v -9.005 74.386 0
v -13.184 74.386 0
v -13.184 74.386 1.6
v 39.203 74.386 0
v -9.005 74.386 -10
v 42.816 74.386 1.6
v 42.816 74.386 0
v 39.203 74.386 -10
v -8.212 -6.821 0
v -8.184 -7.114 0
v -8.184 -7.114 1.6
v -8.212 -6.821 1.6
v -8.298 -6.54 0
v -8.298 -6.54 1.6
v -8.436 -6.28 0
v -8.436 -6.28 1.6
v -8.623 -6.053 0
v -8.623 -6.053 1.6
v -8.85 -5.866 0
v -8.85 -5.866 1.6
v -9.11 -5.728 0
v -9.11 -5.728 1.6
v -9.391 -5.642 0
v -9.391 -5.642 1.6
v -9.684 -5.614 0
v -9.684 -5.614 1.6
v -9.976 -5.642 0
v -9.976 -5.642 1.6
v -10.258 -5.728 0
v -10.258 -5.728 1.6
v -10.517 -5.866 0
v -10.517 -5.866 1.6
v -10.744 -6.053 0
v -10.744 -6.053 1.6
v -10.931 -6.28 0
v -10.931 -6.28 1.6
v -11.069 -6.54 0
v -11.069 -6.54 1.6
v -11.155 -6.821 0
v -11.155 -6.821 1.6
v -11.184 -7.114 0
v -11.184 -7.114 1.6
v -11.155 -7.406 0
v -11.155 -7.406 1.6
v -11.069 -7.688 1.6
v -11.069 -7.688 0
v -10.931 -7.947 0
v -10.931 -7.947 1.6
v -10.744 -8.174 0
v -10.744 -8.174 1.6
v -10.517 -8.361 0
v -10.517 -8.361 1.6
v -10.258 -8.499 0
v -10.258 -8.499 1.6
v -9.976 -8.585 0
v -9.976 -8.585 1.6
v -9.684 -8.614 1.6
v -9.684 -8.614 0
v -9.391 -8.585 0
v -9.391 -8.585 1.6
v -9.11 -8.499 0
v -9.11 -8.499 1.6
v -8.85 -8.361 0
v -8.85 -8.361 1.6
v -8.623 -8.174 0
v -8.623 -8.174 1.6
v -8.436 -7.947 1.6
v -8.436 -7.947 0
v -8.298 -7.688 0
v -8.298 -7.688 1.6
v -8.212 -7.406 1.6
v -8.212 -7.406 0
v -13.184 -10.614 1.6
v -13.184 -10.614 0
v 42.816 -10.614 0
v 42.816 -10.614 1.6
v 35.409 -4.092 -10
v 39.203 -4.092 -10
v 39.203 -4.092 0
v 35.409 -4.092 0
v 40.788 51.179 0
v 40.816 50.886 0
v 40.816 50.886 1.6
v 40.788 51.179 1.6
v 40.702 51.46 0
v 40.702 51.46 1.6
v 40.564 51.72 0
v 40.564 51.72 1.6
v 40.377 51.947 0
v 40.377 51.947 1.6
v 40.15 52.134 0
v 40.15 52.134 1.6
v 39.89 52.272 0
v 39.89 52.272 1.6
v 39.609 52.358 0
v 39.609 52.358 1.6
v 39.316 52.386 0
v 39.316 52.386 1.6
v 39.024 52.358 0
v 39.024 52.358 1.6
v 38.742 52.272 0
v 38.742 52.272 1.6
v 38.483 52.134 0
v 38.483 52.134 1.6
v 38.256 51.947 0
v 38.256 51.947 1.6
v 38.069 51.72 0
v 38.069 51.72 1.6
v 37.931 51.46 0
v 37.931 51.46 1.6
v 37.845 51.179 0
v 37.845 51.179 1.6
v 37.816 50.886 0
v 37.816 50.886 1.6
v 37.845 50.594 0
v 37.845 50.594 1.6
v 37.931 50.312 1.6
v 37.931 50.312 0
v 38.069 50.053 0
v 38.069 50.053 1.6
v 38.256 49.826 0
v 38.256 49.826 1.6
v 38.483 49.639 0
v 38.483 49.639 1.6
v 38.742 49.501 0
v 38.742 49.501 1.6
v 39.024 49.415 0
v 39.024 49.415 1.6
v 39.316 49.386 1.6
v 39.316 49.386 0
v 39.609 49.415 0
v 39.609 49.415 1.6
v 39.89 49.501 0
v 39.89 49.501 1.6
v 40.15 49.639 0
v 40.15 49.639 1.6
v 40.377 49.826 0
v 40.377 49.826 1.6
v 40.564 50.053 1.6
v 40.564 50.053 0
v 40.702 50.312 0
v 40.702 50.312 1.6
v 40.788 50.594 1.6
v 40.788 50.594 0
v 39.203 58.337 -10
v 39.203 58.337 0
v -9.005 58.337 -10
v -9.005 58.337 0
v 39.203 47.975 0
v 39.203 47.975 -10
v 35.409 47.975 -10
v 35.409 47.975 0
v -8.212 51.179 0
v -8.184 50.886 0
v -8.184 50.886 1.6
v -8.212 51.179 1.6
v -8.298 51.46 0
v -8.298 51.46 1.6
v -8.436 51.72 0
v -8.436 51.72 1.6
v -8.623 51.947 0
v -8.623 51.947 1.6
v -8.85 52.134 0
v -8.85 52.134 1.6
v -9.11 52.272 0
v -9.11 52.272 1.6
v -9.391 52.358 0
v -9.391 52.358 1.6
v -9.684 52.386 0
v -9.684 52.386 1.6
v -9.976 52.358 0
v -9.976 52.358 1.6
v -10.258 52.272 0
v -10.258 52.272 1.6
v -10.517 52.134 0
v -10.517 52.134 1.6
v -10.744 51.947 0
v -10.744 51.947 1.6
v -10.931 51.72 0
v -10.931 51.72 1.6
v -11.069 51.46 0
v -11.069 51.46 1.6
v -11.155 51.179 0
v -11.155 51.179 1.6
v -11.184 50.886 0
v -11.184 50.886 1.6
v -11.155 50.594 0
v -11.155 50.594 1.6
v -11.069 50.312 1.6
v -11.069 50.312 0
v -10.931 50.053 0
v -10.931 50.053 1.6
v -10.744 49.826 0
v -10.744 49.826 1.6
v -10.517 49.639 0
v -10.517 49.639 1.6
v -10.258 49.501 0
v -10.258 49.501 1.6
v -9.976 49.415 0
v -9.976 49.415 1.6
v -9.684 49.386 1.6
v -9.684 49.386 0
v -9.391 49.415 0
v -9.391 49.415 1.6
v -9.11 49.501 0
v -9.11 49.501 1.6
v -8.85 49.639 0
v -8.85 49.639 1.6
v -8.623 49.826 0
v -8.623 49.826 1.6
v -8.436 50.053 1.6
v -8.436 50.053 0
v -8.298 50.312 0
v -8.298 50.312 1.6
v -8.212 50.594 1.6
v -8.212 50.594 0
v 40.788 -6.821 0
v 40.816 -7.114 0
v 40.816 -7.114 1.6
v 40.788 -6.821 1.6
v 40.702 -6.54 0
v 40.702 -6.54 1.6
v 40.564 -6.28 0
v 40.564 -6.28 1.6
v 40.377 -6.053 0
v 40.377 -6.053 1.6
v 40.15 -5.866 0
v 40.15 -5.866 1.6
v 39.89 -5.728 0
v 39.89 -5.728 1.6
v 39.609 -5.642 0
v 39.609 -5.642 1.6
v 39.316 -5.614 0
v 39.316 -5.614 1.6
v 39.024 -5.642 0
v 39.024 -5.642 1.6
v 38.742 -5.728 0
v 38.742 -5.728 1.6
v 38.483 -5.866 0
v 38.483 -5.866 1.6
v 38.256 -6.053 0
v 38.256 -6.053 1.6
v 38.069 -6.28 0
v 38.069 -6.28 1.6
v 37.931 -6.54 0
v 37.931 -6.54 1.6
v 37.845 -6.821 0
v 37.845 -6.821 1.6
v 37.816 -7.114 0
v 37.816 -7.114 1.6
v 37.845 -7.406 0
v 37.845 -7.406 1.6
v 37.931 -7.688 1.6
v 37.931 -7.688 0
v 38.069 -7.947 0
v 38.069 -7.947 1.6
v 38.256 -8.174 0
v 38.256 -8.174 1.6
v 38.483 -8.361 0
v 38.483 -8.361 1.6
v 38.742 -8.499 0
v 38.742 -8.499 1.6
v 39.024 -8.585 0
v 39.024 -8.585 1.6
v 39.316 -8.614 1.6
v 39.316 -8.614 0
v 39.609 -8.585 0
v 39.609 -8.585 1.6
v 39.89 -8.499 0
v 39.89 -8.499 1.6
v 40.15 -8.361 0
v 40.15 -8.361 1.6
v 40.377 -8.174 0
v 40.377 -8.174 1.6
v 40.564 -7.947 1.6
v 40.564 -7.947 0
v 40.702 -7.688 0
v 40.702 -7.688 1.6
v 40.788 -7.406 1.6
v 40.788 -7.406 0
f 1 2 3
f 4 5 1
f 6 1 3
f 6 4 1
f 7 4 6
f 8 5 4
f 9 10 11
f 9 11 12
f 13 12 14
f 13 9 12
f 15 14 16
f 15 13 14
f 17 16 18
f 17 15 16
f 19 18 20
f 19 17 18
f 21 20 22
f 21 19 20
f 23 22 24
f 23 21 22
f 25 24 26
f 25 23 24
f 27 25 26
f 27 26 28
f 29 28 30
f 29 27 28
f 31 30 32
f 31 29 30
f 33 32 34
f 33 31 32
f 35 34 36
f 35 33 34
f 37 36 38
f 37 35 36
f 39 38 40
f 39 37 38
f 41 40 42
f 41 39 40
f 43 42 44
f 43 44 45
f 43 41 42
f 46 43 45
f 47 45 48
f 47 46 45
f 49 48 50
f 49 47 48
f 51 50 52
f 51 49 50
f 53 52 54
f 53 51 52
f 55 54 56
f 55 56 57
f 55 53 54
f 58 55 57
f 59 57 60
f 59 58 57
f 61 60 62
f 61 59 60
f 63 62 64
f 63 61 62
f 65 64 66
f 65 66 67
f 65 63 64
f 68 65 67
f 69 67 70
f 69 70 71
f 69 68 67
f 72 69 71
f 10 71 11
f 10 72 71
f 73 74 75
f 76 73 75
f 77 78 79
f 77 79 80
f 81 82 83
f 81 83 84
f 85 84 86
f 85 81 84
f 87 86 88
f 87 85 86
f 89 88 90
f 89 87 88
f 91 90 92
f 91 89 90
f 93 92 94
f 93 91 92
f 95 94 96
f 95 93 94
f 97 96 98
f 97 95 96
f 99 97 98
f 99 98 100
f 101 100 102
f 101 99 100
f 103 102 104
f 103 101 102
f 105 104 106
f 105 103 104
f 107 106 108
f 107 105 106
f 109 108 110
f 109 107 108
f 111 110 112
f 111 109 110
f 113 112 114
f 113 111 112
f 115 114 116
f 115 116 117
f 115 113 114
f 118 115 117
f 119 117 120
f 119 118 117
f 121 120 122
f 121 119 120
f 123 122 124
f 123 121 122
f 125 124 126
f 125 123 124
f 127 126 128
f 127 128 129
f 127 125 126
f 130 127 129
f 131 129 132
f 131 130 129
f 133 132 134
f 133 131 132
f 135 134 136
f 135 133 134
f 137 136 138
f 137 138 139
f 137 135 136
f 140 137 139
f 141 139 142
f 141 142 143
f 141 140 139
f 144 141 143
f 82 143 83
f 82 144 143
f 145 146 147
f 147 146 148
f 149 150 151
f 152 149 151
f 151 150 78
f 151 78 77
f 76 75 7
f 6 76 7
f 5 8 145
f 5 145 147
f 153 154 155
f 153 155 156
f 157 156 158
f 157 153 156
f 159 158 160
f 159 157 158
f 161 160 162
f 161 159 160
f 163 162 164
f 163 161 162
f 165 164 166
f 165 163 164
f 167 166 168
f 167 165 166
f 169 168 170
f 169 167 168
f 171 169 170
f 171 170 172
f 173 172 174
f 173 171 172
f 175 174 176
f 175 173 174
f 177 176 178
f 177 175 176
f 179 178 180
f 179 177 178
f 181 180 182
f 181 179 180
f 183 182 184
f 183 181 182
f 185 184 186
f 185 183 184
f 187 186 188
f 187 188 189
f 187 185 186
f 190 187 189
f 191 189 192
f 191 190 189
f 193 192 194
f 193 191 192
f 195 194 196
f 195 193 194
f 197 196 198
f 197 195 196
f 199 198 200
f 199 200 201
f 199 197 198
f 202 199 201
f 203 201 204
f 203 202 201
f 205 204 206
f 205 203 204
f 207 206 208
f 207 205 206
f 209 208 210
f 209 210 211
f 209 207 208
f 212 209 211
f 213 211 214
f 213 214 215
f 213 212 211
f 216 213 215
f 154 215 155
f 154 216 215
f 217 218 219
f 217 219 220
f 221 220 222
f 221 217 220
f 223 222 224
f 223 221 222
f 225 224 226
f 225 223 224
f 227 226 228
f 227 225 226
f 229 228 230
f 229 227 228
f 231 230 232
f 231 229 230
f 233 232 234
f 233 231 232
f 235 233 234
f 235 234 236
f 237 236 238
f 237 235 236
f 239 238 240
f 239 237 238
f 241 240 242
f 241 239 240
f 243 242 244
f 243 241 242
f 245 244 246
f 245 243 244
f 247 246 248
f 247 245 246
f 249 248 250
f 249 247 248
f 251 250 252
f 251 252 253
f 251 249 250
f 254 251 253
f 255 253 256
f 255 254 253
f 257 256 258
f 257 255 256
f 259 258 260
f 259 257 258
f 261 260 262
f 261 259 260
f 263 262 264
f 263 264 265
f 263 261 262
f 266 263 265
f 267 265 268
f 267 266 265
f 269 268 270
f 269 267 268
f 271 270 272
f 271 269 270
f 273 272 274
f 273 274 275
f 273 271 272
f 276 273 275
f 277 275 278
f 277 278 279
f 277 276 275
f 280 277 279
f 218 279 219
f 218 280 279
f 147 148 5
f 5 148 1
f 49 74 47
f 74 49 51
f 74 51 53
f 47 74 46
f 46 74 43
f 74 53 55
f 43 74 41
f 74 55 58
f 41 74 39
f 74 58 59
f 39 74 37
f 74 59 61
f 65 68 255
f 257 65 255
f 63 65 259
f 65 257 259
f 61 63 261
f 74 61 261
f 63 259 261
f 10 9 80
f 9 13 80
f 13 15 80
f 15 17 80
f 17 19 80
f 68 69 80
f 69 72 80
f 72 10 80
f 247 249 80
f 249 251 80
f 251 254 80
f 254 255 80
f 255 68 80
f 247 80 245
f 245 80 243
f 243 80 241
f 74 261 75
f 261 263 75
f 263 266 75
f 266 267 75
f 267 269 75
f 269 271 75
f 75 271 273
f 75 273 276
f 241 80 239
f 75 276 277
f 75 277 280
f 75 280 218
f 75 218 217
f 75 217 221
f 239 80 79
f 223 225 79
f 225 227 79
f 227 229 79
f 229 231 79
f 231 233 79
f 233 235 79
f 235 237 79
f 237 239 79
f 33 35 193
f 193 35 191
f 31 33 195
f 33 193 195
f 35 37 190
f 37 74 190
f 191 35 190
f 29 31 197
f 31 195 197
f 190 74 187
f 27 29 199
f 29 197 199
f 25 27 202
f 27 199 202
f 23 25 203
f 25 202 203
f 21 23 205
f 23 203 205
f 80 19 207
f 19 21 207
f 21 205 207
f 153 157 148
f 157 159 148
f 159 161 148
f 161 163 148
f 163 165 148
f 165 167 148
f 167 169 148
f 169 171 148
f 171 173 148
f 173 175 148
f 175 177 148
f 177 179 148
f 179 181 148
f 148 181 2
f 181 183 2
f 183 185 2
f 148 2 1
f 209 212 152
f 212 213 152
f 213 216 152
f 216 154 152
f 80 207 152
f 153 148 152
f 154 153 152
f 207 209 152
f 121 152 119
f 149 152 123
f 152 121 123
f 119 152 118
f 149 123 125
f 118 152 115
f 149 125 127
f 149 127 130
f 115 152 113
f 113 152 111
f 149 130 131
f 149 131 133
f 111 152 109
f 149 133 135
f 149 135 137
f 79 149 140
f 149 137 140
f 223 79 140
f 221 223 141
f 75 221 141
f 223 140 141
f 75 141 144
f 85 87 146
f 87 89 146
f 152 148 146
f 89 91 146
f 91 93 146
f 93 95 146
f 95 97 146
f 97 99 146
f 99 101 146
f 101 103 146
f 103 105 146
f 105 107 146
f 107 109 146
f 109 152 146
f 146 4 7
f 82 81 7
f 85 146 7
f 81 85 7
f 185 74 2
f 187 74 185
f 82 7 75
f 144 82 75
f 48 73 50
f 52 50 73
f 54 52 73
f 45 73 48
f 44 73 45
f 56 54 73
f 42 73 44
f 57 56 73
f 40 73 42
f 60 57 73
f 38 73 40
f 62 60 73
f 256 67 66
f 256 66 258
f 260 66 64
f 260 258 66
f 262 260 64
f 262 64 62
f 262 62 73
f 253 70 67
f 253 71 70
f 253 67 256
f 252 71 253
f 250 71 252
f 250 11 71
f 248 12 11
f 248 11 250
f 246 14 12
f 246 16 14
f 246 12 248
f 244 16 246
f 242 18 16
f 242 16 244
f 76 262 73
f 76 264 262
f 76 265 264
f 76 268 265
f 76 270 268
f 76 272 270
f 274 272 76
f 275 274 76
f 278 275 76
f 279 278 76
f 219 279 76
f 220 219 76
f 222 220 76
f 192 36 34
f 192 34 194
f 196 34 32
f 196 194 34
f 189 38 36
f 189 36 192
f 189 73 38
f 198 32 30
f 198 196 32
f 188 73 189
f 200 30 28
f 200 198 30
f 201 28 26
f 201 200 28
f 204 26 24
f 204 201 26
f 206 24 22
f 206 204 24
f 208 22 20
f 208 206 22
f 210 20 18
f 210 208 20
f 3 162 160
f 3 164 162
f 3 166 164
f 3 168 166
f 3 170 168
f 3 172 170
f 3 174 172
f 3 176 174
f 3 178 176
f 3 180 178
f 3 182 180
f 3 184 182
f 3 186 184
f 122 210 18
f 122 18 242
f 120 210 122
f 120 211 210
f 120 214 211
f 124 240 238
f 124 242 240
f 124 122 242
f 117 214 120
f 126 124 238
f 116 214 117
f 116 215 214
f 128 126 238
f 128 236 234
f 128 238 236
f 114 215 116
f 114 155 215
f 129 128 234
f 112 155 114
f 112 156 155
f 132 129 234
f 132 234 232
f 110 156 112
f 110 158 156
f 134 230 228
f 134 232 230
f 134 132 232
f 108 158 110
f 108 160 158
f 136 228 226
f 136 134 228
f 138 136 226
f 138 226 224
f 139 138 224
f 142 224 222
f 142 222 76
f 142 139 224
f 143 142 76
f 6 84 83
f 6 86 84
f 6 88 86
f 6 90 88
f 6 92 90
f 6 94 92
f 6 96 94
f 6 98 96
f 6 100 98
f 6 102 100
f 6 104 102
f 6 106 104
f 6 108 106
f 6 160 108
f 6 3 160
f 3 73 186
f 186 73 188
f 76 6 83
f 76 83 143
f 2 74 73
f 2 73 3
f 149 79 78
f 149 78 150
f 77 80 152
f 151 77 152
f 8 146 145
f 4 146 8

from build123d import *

# Parameters (mm, degrees)
SKETCH_1_R      = 1.5
EXTRUDE_1_DEPTH = 1.6
SKETCH_2_W      = 48.207961956
SKETCH_2_H      = 16.049260915
SKETCH_2_W_2    = 3.793795092
SKETCH_2_H_2    = 52.066933367
EXTRUDE_2_DEPTH = 10


with BuildPart() as part:
    # 草图1 → 凸台-拉伸1 (new body)
    with BuildSketch(Plane.XY):
        Polygon((-13.183660203, 74.386417716), (-13.183660203, -7.113582284), (-13.183660203, -10.613582284), (42.816339797, -10.613582284), (42.816339797, 74.386417716), align=None)
        with BuildLine():
            ThreePointArc((-8.183660203, -7.113582284), (-9.683660203, -8.613582284), (-11.183660203, -7.113582284))
            ThreePointArc((-11.183660203, -7.113582284), (-9.683660203, -5.613582284), (-8.183660203, -7.113582284))
        make_face(mode=Mode.SUBTRACT)
        with Locations((39.316339797, -7.113582284)):
            Circle(SKETCH_1_R, mode=Mode.SUBTRACT)
        with Locations((-9.683660203, 50.886417716)):
            Circle(SKETCH_1_R, mode=Mode.SUBTRACT)
        with Locations((39.316339797, 50.886417716)):
            Circle(SKETCH_1_R, mode=Mode.SUBTRACT)
    extrude(amount=EXTRUDE_1_DEPTH)

    # 草图2 → 凸台-拉伸2 (add)
    with BuildSketch(Plane(origin=(0, 0, 0), x_dir=(-1, 0, 0), z_dir=(0, 0, -1))):
        with Locations((-15.098918569, 66.361787259)):
            Rectangle(SKETCH_2_W, SKETCH_2_H)
        with Locations((-37.306002001, 21.941048421)):
            Rectangle(SKETCH_2_W_2, SKETCH_2_H_2)
    extrude(amount=EXTRUDE_2_DEPTH)


solid = part.part
